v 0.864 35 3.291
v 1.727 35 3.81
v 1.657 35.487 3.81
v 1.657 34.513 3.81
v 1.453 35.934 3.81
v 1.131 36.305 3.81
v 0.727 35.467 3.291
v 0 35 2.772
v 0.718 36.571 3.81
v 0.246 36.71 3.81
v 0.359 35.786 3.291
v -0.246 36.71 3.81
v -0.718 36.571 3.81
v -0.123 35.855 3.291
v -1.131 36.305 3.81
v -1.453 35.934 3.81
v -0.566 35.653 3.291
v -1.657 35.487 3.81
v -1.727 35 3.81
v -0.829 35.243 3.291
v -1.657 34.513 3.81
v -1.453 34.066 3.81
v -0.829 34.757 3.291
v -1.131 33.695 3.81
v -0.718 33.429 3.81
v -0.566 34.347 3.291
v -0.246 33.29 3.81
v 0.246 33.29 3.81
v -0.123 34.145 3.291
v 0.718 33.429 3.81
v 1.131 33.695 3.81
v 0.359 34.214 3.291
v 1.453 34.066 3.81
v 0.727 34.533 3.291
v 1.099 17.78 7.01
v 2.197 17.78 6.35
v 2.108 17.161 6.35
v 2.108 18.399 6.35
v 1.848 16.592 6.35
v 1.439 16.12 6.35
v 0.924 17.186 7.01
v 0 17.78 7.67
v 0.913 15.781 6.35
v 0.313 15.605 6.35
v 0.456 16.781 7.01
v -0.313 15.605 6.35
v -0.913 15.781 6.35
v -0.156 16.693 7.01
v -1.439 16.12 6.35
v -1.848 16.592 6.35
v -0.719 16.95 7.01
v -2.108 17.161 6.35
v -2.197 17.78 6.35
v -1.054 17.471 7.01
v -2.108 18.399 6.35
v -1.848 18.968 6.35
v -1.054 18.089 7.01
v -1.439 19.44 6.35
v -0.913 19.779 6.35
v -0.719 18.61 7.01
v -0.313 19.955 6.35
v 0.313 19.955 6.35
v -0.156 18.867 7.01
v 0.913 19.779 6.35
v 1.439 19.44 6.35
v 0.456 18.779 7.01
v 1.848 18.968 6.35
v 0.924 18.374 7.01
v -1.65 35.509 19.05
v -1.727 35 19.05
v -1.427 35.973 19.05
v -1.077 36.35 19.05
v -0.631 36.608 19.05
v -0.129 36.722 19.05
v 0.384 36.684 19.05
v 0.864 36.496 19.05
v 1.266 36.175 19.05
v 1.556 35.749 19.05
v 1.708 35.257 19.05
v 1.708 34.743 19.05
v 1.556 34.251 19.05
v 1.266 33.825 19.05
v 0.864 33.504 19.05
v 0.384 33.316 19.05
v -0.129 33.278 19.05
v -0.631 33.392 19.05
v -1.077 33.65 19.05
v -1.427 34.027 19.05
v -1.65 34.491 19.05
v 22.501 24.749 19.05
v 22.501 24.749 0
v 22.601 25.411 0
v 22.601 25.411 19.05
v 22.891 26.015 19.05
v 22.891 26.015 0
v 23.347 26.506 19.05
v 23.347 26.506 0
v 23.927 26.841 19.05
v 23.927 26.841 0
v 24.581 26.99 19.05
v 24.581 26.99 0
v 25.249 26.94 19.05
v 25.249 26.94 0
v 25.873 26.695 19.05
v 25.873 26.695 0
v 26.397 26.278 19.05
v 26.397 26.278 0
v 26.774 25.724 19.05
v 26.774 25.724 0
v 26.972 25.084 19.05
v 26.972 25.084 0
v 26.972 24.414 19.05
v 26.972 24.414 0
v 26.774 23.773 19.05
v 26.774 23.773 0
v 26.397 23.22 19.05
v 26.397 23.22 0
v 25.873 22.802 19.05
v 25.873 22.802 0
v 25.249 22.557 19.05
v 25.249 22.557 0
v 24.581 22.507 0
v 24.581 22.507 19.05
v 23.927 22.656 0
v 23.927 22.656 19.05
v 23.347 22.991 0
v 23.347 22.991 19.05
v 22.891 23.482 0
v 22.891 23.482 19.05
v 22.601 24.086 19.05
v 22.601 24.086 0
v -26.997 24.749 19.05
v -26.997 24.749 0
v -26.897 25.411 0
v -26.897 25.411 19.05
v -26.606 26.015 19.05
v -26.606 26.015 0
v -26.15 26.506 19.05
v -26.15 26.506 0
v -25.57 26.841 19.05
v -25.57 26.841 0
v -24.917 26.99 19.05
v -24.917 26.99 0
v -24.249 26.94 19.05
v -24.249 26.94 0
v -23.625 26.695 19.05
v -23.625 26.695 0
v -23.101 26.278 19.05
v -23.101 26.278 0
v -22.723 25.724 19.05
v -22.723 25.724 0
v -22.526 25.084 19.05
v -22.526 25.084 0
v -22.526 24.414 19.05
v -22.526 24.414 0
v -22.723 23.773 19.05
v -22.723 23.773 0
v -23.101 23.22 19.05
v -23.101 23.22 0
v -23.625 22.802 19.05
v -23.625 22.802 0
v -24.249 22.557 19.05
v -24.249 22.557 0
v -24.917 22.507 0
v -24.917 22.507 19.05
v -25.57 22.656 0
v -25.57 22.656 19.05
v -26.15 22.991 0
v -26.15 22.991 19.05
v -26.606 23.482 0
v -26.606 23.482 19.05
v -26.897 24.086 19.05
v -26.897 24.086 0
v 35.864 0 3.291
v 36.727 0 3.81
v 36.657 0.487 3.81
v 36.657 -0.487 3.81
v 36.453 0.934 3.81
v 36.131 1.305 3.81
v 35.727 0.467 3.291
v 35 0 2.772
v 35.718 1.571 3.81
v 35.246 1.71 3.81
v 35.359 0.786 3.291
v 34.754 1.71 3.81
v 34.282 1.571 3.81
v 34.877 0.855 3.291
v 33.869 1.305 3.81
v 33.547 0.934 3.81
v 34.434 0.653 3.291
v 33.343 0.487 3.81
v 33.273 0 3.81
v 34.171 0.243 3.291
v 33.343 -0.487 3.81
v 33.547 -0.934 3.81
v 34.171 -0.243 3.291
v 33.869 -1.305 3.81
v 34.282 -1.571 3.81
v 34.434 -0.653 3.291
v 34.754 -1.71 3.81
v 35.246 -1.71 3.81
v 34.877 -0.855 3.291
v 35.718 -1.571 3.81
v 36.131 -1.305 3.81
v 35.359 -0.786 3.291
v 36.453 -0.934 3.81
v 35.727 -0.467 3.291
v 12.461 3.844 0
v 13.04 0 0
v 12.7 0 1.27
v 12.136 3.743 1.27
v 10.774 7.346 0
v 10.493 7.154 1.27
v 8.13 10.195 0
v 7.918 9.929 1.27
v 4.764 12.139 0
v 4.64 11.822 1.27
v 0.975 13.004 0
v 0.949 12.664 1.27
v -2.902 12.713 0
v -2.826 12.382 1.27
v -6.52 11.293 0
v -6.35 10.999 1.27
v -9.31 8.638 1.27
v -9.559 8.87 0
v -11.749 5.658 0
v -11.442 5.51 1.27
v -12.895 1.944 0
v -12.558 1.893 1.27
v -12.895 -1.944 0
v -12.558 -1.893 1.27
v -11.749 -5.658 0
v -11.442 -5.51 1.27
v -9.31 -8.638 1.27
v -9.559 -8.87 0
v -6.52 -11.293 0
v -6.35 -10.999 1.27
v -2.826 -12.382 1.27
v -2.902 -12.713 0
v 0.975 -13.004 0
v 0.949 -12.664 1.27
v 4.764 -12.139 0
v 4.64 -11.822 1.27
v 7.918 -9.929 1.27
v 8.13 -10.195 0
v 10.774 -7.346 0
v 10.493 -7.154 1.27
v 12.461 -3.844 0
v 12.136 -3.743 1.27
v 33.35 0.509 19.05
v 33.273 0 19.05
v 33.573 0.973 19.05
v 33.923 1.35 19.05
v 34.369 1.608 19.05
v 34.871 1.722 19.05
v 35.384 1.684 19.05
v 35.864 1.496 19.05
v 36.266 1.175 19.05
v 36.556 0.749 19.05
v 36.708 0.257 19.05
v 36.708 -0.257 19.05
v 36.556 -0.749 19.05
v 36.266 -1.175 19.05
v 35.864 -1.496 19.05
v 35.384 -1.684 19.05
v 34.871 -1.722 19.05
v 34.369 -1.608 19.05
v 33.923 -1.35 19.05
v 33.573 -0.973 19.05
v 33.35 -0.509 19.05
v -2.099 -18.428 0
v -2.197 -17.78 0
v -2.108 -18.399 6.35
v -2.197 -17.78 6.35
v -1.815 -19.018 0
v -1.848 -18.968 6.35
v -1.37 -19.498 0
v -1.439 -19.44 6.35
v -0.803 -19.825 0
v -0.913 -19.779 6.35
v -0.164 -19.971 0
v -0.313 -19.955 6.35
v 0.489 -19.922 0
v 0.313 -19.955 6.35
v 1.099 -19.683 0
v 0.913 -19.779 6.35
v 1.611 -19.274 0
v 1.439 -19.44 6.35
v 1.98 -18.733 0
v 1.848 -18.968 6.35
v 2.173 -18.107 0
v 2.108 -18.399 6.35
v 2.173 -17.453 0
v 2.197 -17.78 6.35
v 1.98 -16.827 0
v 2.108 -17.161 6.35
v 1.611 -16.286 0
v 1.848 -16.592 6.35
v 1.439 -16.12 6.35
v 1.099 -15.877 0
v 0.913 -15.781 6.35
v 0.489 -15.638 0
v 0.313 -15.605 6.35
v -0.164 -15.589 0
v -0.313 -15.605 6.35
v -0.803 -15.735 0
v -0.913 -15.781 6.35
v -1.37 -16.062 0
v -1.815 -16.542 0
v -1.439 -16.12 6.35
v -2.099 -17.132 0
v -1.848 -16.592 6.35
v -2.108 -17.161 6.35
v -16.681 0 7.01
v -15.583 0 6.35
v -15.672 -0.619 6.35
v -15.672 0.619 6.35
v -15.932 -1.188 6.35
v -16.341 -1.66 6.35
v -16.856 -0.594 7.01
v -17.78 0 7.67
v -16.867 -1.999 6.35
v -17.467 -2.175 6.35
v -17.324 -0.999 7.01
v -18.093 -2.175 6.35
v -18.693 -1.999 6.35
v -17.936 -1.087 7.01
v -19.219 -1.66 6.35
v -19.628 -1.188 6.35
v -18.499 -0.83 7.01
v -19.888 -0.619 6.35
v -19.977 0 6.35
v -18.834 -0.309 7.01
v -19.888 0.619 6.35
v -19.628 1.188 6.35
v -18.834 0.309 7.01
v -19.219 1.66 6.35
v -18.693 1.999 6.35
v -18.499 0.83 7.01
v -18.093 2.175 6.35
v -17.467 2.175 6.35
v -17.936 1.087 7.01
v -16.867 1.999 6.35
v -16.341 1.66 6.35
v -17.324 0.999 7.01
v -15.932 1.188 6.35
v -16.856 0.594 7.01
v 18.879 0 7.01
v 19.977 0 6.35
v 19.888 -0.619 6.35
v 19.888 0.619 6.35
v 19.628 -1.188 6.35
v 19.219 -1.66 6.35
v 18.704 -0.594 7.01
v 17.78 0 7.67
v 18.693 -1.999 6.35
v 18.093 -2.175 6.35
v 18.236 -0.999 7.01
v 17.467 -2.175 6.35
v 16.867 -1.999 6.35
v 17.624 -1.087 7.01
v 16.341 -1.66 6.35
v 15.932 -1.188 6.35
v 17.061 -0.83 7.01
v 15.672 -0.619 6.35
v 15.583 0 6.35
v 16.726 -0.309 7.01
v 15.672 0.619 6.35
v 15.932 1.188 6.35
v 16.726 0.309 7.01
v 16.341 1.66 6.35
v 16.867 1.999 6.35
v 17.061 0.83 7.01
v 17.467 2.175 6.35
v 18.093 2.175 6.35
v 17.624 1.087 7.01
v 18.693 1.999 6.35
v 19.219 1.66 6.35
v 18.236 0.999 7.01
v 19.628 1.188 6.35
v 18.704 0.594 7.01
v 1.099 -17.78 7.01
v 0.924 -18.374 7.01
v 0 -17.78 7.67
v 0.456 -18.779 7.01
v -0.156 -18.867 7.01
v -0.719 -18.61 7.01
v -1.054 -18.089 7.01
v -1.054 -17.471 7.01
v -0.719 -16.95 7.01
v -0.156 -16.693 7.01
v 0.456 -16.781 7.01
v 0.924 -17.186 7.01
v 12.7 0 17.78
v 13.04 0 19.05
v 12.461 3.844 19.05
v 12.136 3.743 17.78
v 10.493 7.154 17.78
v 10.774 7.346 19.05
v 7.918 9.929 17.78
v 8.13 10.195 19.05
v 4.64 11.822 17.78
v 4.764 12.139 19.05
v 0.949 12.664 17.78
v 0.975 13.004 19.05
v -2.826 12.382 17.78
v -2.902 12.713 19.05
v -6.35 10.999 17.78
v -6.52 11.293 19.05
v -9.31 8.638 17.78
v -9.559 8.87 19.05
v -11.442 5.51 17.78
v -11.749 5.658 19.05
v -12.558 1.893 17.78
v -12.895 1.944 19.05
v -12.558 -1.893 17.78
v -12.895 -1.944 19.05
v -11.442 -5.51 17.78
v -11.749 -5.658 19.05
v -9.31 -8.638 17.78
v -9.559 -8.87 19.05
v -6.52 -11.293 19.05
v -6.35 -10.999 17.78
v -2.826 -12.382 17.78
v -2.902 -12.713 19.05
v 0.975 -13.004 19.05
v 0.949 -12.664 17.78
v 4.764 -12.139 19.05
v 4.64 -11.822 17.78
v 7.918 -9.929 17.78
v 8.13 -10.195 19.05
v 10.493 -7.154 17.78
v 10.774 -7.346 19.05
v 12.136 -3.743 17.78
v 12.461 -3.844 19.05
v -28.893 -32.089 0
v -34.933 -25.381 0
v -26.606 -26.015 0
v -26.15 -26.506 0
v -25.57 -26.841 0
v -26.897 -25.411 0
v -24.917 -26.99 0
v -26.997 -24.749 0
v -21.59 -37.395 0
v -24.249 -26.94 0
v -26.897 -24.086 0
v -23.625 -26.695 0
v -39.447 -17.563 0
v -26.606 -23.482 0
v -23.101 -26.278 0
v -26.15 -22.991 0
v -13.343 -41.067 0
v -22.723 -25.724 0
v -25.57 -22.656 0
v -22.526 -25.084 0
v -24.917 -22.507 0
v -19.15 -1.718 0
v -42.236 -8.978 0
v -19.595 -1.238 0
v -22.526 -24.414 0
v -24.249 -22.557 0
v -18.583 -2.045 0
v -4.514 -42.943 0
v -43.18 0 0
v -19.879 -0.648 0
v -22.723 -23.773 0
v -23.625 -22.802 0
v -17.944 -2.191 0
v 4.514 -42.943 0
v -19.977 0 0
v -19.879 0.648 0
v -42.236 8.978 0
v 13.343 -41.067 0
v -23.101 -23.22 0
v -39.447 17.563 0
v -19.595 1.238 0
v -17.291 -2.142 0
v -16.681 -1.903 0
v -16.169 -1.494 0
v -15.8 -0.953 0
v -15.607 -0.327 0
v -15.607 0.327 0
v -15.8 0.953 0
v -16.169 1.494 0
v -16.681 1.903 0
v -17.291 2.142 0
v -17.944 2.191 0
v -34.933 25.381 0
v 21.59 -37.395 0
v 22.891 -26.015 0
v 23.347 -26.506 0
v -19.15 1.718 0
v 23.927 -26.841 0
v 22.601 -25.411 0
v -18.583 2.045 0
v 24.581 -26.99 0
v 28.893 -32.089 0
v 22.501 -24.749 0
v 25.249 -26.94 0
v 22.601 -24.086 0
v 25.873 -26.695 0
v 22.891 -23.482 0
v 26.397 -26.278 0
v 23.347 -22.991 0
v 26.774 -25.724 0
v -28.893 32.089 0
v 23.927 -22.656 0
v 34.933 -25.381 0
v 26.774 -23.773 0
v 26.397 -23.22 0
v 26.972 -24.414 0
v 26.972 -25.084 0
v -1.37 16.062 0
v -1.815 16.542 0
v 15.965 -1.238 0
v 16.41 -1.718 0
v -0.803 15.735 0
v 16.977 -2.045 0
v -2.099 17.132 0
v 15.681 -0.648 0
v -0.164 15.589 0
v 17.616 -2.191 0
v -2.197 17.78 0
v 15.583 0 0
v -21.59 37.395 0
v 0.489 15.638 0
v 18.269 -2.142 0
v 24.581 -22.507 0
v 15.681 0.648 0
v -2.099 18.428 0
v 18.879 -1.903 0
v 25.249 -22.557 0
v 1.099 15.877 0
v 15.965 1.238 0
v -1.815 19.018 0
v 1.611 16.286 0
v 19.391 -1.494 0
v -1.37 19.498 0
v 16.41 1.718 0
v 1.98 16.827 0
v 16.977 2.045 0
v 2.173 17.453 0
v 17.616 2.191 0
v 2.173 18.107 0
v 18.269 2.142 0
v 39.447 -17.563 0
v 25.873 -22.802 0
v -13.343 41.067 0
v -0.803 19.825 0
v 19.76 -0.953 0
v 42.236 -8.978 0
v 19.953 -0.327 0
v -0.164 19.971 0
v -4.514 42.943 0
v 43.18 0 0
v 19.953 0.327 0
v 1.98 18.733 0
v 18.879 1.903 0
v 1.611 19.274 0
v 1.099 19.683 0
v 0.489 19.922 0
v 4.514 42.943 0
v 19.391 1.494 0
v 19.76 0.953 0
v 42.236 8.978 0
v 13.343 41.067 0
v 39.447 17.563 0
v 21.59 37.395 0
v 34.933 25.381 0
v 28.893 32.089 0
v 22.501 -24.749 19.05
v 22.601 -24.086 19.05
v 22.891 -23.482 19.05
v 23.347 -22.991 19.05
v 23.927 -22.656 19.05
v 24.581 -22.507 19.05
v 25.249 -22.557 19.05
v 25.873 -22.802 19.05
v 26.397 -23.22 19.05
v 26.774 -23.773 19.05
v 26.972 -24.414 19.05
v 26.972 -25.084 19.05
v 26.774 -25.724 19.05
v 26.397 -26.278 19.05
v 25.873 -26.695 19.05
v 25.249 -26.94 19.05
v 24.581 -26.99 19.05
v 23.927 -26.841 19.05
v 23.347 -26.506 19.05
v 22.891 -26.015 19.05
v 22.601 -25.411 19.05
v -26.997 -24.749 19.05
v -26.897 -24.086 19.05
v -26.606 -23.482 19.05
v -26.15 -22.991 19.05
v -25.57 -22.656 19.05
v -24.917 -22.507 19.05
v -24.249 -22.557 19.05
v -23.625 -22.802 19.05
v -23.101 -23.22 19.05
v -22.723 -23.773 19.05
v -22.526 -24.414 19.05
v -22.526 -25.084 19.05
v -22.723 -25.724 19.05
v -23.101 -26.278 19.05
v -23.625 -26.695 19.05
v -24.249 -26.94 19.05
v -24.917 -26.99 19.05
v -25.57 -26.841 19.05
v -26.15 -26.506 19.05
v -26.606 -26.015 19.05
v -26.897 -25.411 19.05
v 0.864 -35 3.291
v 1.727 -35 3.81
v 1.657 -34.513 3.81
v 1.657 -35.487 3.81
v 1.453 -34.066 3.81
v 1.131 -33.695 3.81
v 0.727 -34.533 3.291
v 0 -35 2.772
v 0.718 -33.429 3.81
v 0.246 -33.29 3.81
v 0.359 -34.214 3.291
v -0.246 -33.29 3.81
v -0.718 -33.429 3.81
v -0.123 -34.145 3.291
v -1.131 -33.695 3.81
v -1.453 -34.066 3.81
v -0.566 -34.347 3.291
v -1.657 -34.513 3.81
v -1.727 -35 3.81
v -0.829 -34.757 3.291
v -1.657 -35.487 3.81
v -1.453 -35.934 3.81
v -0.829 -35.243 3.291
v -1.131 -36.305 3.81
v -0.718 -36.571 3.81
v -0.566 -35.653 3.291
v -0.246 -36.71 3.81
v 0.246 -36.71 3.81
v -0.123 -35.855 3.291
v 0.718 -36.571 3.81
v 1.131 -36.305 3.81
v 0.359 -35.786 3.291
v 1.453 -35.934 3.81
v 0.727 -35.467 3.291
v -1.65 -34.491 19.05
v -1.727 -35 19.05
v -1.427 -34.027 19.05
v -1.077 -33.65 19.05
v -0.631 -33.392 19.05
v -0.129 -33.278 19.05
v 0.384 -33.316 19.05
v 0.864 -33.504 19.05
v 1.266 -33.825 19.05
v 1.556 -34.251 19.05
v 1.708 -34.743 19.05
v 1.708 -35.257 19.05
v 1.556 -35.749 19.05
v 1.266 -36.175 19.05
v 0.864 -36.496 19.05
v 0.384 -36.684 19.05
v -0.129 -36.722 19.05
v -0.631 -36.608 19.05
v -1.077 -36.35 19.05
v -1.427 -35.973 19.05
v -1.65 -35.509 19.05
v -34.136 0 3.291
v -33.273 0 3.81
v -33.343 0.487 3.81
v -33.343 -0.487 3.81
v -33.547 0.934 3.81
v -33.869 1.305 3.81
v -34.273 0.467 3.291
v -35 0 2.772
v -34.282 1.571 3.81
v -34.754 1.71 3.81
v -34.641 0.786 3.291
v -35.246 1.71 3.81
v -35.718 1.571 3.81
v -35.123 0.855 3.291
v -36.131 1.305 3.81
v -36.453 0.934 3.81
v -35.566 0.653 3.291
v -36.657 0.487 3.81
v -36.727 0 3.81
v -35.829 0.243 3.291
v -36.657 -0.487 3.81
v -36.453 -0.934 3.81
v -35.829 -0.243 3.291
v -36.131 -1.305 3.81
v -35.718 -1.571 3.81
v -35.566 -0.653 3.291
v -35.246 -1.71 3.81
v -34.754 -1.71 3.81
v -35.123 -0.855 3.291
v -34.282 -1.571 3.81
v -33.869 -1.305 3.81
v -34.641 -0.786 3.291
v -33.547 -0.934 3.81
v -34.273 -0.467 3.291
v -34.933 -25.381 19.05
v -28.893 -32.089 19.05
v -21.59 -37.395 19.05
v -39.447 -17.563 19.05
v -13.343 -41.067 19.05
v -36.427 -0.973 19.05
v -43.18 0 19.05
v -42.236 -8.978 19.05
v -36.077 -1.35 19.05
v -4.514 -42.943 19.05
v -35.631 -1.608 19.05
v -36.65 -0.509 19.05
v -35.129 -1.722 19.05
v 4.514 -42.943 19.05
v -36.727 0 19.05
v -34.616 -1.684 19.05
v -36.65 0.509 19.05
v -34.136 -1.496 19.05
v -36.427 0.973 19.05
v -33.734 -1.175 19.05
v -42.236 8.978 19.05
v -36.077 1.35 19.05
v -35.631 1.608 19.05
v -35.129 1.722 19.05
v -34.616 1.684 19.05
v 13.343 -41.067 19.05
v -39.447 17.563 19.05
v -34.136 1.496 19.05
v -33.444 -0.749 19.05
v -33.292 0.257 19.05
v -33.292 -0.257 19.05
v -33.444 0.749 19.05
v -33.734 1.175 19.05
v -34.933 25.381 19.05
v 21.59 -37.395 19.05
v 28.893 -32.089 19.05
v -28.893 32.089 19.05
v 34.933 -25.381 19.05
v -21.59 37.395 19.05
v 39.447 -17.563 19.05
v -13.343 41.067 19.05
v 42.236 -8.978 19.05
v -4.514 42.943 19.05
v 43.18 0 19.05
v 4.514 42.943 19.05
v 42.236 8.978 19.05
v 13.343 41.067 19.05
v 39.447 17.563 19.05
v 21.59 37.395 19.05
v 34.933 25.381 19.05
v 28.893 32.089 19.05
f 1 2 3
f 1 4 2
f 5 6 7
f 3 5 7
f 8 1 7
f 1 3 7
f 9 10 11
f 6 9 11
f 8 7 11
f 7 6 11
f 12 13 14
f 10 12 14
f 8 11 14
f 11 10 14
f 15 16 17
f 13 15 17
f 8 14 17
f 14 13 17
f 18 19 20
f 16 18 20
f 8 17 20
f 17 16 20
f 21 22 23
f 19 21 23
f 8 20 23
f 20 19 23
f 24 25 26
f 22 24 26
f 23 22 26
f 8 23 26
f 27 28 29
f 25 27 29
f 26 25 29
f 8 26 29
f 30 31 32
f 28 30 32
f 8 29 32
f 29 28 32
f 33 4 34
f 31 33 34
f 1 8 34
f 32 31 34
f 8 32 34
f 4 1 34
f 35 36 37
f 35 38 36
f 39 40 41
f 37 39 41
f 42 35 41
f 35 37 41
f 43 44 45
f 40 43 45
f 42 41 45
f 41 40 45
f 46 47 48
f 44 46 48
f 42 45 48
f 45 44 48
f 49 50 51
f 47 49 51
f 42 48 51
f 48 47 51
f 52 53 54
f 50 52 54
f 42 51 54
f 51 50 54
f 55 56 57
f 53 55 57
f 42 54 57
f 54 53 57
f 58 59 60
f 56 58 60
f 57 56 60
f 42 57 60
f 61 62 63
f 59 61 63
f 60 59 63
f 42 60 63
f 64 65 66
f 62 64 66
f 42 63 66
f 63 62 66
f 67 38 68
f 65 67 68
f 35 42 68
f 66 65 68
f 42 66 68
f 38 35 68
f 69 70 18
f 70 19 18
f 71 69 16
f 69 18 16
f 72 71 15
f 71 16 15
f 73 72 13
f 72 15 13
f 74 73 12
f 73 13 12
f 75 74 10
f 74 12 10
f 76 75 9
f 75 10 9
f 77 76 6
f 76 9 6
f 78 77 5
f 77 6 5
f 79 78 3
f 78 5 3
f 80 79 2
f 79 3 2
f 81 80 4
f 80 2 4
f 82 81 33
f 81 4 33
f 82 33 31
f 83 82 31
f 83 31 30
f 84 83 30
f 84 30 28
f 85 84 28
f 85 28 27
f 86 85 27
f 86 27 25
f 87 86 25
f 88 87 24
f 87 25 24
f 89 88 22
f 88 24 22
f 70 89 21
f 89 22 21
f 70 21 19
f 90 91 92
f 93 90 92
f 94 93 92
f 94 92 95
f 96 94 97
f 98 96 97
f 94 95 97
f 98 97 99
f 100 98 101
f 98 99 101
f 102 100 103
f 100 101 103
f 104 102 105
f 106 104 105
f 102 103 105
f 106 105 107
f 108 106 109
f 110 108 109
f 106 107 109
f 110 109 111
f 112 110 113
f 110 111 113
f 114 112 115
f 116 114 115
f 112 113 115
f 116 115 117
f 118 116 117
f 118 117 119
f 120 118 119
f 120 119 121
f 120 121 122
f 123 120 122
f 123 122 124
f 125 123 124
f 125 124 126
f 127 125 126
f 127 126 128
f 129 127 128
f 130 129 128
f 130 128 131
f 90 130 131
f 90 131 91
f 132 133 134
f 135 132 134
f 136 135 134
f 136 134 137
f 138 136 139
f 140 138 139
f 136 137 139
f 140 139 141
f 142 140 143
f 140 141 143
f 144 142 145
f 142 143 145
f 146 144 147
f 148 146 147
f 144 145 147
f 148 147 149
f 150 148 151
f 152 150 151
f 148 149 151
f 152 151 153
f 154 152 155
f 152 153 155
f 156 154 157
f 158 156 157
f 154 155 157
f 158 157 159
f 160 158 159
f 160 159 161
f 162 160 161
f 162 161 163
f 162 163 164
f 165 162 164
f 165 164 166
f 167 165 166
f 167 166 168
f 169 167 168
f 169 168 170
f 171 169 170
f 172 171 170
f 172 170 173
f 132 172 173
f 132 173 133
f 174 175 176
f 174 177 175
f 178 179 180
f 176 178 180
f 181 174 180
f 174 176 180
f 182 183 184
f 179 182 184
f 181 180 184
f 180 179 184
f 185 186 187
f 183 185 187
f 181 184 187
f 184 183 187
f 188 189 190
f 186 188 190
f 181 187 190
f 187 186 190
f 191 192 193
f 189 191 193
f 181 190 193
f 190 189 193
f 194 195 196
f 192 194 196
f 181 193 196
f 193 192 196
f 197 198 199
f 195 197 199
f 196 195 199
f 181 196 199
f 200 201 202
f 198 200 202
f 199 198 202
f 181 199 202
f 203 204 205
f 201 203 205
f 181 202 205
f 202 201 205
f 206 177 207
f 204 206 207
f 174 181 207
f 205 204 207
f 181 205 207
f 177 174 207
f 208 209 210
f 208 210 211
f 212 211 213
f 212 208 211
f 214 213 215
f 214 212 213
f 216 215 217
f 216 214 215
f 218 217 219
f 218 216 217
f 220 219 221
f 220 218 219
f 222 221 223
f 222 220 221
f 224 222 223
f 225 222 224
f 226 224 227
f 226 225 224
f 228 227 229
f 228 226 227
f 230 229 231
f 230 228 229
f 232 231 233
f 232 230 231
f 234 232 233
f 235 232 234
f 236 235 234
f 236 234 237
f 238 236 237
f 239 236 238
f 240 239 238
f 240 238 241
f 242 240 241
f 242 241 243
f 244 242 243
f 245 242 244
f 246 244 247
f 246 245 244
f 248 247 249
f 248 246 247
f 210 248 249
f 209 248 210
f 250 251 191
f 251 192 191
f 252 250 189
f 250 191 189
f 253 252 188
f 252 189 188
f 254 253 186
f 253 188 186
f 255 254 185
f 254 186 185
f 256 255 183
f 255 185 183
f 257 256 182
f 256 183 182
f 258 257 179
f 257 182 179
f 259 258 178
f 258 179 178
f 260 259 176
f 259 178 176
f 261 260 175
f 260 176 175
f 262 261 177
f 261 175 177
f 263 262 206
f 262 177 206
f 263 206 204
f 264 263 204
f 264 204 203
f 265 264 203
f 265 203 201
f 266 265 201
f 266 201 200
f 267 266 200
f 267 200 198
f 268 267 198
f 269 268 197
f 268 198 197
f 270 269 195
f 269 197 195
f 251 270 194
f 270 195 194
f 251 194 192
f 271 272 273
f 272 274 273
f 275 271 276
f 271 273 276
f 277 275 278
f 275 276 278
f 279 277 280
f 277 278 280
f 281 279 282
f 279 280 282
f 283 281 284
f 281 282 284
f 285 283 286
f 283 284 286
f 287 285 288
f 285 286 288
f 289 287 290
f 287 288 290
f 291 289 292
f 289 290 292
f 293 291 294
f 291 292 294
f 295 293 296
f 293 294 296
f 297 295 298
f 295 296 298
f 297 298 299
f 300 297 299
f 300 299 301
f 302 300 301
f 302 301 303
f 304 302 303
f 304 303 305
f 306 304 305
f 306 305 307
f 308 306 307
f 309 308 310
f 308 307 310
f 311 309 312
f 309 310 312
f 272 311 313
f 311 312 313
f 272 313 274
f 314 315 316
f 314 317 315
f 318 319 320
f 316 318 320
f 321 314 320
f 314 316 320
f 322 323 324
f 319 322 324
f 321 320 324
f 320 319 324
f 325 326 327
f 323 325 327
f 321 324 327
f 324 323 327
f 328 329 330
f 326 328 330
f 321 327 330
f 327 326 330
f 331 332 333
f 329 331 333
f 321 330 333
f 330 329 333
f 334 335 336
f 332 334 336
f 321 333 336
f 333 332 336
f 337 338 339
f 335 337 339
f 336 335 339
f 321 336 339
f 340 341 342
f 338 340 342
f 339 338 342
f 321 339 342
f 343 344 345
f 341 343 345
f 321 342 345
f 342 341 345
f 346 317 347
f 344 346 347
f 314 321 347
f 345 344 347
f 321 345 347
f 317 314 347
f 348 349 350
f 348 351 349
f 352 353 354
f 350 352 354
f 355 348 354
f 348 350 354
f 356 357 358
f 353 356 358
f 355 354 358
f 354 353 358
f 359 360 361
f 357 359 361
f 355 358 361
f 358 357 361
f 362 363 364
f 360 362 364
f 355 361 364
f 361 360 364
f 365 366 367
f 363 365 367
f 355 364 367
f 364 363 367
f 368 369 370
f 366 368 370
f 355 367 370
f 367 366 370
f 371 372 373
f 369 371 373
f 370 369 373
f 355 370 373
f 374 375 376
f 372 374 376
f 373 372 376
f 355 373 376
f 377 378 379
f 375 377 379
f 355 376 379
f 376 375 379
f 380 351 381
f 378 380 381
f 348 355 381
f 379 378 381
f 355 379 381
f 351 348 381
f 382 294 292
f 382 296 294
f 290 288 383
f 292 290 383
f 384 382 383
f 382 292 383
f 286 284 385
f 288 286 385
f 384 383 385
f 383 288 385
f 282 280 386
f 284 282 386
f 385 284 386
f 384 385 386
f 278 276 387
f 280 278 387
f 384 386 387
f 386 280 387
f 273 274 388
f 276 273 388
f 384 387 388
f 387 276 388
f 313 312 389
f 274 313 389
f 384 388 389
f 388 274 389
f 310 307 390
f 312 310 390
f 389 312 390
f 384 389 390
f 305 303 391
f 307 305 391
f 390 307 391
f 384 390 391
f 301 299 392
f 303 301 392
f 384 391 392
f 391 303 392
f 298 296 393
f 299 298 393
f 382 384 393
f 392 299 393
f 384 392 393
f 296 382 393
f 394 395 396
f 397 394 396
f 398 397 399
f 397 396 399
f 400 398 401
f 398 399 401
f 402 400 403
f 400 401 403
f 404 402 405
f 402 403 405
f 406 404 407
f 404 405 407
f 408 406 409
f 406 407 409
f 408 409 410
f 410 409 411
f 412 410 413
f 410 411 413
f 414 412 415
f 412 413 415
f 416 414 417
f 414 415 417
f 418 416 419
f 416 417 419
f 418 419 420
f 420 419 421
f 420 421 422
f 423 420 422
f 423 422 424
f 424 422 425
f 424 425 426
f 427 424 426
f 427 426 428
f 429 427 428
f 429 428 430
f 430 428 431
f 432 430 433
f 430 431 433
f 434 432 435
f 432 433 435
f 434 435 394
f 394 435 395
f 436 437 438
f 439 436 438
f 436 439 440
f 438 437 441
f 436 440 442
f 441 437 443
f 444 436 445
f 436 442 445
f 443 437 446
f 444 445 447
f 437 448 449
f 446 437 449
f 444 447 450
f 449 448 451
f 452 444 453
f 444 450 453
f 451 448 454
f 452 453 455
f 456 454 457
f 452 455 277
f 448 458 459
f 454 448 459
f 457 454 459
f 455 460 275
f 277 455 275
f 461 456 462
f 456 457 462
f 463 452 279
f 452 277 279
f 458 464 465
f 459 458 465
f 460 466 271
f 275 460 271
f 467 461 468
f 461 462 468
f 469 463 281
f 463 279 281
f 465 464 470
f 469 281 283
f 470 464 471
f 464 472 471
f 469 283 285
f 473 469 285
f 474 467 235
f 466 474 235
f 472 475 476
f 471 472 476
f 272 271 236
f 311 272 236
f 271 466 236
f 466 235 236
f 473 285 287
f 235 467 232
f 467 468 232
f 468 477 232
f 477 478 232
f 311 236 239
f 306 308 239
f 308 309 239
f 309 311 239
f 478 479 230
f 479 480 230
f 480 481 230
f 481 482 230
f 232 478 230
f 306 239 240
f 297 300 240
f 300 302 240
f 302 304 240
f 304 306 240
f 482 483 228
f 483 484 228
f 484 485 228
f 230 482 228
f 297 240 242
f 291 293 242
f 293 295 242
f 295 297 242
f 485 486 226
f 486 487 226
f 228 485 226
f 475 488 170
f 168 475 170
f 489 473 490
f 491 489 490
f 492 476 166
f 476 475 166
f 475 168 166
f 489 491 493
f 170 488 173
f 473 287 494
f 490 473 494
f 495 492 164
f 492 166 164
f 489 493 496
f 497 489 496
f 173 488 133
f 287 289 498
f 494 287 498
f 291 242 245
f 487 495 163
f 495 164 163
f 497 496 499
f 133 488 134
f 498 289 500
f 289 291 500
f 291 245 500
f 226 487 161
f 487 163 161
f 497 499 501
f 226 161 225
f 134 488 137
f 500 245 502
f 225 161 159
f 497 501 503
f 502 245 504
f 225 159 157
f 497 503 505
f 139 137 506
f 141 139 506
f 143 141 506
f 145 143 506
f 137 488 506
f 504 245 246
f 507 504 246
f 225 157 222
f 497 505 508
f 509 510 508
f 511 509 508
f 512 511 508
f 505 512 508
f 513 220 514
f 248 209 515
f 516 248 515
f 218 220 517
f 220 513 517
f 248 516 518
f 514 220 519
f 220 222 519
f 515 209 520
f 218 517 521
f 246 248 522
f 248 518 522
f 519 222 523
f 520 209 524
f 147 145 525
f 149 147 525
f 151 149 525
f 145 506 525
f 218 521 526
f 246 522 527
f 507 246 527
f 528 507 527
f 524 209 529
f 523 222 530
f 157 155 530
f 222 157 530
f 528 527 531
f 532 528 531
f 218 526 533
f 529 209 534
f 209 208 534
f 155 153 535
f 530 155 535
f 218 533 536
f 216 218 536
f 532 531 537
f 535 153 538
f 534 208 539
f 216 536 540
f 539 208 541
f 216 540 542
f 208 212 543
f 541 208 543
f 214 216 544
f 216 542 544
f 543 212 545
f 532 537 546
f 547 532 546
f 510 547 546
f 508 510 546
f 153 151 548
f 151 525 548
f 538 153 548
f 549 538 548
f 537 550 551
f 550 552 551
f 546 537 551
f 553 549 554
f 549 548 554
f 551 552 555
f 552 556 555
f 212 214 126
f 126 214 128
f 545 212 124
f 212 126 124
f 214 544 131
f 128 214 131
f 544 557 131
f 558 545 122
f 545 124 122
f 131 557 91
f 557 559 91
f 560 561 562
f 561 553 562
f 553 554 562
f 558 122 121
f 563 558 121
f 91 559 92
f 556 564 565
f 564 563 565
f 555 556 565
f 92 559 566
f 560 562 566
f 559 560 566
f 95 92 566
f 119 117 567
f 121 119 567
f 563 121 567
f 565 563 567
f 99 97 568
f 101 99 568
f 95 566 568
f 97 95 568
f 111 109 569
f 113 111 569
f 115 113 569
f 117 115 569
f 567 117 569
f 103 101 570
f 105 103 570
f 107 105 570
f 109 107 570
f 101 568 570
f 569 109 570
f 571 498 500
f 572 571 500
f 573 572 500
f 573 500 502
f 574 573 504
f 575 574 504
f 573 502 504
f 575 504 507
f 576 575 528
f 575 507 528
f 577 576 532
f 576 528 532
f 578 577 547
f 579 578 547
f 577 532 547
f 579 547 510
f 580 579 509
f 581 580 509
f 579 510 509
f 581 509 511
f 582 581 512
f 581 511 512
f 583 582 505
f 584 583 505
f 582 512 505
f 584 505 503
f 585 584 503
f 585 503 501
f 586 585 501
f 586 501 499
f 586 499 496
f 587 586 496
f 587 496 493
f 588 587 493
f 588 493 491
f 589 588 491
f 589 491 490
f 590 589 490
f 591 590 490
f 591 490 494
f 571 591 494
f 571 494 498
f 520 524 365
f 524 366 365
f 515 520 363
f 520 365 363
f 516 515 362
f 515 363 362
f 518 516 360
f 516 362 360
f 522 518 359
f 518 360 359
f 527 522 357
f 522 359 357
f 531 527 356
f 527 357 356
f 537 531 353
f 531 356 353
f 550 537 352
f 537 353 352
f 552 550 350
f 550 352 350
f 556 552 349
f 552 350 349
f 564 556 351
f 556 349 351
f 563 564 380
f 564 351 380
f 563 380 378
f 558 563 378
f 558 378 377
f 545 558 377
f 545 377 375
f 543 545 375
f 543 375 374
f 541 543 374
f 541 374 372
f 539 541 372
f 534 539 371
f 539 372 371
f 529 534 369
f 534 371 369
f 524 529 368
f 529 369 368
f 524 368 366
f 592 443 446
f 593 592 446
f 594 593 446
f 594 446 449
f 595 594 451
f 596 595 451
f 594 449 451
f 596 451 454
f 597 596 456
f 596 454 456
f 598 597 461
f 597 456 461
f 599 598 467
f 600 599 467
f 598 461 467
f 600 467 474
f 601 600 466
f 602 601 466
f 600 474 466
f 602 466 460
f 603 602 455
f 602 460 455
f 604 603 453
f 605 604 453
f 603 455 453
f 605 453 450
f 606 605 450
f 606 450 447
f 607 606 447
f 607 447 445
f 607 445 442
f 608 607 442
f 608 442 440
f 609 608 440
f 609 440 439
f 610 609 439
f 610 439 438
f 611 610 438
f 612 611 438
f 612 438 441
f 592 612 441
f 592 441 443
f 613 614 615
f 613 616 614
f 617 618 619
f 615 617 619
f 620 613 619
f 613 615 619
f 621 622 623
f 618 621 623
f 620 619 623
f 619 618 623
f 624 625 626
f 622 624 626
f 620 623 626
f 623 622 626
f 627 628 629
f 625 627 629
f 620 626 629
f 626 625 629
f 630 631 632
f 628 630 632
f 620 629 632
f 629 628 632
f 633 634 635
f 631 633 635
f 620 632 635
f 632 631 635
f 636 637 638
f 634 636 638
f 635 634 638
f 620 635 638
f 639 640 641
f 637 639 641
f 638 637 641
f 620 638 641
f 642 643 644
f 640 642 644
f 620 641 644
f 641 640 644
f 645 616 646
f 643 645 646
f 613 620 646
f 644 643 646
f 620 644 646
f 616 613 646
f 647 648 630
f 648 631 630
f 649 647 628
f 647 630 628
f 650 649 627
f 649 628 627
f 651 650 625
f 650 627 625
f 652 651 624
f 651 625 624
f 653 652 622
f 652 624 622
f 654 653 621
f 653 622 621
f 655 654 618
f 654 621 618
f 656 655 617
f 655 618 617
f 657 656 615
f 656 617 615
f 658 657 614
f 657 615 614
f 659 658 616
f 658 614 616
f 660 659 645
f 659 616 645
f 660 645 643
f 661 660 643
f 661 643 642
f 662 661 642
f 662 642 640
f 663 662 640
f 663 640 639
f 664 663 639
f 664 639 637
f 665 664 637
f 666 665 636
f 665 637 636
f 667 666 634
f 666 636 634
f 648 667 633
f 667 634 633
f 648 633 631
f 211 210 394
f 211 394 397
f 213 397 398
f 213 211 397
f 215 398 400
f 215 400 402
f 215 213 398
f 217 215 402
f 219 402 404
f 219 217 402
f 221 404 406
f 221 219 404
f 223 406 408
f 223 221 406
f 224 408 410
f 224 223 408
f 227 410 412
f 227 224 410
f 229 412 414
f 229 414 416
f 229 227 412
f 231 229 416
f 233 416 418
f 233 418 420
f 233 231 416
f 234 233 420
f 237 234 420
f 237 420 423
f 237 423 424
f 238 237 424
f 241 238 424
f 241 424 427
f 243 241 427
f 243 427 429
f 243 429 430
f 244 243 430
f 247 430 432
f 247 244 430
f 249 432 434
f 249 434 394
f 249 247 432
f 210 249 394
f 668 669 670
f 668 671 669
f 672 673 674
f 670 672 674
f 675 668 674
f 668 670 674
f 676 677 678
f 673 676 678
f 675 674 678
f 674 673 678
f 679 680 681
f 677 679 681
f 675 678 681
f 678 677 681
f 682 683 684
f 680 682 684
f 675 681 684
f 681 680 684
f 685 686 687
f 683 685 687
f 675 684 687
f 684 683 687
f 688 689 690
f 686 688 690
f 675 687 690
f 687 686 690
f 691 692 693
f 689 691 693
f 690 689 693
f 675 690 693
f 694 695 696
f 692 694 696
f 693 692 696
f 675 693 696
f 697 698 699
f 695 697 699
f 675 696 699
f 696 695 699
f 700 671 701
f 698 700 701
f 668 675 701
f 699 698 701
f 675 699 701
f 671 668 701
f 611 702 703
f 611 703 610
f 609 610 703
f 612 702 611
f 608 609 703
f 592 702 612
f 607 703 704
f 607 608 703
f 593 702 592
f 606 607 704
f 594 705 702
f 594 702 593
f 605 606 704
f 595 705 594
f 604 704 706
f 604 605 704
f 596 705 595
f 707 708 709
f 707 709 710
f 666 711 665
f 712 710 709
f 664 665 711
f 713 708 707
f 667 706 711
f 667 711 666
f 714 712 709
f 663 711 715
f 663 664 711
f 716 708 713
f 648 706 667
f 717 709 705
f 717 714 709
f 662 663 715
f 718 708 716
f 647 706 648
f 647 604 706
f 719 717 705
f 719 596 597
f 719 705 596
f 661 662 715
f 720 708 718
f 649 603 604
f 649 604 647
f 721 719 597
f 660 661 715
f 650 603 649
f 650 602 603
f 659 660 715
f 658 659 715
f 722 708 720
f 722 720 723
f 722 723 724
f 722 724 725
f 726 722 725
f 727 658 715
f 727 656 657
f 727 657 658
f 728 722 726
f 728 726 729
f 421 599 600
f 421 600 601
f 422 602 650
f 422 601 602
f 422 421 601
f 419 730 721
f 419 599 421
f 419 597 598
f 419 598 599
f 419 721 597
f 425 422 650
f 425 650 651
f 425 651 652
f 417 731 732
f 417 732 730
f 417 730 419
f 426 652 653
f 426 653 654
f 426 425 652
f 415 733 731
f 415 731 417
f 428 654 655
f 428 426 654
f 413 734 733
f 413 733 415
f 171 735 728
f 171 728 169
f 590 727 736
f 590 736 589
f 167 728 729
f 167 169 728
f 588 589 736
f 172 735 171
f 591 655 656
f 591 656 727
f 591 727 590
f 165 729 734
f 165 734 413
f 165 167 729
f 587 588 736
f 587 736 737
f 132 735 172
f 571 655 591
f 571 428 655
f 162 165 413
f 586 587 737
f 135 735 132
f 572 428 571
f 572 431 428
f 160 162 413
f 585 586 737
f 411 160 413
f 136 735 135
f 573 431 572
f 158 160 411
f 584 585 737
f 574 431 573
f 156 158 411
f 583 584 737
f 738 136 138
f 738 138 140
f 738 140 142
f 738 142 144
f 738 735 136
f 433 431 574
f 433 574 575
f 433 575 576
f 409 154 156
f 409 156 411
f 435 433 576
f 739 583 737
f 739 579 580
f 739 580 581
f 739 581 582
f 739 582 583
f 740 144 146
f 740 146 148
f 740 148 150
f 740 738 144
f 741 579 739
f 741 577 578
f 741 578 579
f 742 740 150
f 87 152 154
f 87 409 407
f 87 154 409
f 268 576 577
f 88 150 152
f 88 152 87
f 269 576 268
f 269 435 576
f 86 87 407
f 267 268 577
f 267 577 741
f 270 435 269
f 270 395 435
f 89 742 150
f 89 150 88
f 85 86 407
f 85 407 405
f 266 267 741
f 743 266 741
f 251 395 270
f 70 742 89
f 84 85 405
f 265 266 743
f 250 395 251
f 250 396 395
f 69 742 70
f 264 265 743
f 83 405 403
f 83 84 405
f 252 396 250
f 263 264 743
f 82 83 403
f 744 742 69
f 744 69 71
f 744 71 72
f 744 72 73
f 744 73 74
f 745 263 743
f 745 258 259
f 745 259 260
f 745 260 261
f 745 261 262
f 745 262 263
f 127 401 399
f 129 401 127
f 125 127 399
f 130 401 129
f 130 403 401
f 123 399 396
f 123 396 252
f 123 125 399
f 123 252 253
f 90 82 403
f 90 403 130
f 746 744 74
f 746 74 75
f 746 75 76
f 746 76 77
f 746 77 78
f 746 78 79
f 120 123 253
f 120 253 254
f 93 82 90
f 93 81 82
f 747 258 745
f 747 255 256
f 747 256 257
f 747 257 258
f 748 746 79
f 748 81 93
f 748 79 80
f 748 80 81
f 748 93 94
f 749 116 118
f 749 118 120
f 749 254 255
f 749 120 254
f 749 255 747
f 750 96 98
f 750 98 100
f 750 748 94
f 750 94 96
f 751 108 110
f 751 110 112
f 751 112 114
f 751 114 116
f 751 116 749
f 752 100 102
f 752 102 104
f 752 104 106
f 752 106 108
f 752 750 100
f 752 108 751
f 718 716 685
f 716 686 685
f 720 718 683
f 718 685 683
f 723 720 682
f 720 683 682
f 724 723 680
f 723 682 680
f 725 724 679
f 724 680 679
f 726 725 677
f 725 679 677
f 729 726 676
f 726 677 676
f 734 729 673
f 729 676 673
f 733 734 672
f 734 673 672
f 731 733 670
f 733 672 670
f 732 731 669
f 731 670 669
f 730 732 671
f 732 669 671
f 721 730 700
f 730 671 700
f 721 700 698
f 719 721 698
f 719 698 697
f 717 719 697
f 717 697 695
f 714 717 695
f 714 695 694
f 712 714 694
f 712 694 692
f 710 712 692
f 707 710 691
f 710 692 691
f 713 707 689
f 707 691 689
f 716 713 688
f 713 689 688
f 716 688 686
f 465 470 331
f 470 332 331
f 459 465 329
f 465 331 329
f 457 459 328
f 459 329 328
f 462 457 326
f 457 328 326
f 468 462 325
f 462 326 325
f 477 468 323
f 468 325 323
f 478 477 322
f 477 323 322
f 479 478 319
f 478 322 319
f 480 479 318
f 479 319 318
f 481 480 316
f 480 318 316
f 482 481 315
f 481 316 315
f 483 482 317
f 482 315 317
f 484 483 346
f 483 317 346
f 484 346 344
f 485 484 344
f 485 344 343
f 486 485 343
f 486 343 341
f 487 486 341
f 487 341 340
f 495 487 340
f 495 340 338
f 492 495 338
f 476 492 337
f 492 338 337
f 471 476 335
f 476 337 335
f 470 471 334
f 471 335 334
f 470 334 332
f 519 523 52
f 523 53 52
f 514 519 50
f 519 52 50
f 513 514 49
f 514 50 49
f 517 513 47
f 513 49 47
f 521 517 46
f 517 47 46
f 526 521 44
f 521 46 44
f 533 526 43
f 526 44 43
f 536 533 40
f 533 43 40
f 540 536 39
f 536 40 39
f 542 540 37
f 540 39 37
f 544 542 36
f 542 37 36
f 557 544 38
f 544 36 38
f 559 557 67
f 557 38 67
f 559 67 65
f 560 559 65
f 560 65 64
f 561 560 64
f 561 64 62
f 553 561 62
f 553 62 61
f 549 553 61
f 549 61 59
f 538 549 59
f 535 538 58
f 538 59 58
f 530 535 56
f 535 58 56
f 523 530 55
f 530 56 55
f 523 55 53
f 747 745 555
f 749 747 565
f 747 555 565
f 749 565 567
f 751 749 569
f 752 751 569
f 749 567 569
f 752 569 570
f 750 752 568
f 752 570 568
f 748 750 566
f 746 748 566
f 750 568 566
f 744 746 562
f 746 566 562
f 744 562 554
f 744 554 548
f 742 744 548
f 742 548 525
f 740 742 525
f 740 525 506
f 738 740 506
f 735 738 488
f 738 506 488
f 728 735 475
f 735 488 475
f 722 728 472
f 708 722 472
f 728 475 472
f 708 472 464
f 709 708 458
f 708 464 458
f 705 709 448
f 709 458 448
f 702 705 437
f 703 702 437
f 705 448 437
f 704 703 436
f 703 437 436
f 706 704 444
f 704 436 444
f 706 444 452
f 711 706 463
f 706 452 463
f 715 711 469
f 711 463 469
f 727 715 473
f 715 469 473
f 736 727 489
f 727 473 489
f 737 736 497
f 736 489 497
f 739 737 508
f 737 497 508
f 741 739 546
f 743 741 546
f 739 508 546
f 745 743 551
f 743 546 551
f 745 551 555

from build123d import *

# Parameters (mm, degrees)
F0_R     = 43.18
F0_R_2   = 12.7
F1_DEPTH = 19.05
F2_SIZE2 = 0.3402954744
F2_SIZE  = 1.27
F4_D     = 4.3942
F4_DEPTH = 6.35
F4_TIP   = 1.3201508661
F6_D     = 3.4544
F6_DEPTH = 15.24
F6_TIP   = 1.0378064612
F8_D     = 4.4958


with BuildPart() as f1:
    # F0 (on Top) → F1 (new body)
    with BuildSketch(Plane.XY):
        Circle(F0_R)
        Circle(F0_R_2, mode=Mode.SUBTRACT)
    extrude(amount=F1_DEPTH)

    # F2
    f2_edges = [f1.edges().sort_by_distance(p)[0] for p in [
        (-12.7, 0, 19.05),
        (-12.7, 0, 0),
    ]]
    f2_side = f1.faces().sort_by_distance((-12.7, 0, 9.525))[0]
    chamfer(f2_edges, length=F2_SIZE, length2=F2_SIZE2, reference=f2_side)

    # F4
    with Locations(Plane(origin=(0, 0, 0), x_dir=(1, 0, 0), z_dir=(0, 0, -1))):
        with Locations((0, -17.78), (-17.78, 0), (0, 17.78), (17.78, 0)):
            Hole(F4_D / 2, depth=F4_DEPTH)
            with Locations((0, 0, -(F4_DEPTH + F4_TIP / 2))):  # 118° drill point
                Cone(0, F4_D / 2, F4_TIP, mode=Mode.SUBTRACT)

    # F6
    with Locations(Plane.XY.offset(19.05)):
        with Locations((35, 0), (0, -35), (-35, 0), (0, 35)):
            Hole(F6_D / 2, depth=F6_DEPTH)
            with Locations((0, 0, -(F6_DEPTH + F6_TIP / 2))):  # 118° drill point
                Cone(0, F6_D / 2, F6_TIP, mode=Mode.SUBTRACT)

    # F8 (through all)
    with Locations(Plane.XY.offset(19.05)):
        with Locations((24.7487373415, -24.7487373415), (-24.7487373415, -24.7487373415), (-24.7487373415, 24.7487373415), (24.7487373415, 24.7487373415)):
            Hole(F8_D / 2)


solid = f1.part
